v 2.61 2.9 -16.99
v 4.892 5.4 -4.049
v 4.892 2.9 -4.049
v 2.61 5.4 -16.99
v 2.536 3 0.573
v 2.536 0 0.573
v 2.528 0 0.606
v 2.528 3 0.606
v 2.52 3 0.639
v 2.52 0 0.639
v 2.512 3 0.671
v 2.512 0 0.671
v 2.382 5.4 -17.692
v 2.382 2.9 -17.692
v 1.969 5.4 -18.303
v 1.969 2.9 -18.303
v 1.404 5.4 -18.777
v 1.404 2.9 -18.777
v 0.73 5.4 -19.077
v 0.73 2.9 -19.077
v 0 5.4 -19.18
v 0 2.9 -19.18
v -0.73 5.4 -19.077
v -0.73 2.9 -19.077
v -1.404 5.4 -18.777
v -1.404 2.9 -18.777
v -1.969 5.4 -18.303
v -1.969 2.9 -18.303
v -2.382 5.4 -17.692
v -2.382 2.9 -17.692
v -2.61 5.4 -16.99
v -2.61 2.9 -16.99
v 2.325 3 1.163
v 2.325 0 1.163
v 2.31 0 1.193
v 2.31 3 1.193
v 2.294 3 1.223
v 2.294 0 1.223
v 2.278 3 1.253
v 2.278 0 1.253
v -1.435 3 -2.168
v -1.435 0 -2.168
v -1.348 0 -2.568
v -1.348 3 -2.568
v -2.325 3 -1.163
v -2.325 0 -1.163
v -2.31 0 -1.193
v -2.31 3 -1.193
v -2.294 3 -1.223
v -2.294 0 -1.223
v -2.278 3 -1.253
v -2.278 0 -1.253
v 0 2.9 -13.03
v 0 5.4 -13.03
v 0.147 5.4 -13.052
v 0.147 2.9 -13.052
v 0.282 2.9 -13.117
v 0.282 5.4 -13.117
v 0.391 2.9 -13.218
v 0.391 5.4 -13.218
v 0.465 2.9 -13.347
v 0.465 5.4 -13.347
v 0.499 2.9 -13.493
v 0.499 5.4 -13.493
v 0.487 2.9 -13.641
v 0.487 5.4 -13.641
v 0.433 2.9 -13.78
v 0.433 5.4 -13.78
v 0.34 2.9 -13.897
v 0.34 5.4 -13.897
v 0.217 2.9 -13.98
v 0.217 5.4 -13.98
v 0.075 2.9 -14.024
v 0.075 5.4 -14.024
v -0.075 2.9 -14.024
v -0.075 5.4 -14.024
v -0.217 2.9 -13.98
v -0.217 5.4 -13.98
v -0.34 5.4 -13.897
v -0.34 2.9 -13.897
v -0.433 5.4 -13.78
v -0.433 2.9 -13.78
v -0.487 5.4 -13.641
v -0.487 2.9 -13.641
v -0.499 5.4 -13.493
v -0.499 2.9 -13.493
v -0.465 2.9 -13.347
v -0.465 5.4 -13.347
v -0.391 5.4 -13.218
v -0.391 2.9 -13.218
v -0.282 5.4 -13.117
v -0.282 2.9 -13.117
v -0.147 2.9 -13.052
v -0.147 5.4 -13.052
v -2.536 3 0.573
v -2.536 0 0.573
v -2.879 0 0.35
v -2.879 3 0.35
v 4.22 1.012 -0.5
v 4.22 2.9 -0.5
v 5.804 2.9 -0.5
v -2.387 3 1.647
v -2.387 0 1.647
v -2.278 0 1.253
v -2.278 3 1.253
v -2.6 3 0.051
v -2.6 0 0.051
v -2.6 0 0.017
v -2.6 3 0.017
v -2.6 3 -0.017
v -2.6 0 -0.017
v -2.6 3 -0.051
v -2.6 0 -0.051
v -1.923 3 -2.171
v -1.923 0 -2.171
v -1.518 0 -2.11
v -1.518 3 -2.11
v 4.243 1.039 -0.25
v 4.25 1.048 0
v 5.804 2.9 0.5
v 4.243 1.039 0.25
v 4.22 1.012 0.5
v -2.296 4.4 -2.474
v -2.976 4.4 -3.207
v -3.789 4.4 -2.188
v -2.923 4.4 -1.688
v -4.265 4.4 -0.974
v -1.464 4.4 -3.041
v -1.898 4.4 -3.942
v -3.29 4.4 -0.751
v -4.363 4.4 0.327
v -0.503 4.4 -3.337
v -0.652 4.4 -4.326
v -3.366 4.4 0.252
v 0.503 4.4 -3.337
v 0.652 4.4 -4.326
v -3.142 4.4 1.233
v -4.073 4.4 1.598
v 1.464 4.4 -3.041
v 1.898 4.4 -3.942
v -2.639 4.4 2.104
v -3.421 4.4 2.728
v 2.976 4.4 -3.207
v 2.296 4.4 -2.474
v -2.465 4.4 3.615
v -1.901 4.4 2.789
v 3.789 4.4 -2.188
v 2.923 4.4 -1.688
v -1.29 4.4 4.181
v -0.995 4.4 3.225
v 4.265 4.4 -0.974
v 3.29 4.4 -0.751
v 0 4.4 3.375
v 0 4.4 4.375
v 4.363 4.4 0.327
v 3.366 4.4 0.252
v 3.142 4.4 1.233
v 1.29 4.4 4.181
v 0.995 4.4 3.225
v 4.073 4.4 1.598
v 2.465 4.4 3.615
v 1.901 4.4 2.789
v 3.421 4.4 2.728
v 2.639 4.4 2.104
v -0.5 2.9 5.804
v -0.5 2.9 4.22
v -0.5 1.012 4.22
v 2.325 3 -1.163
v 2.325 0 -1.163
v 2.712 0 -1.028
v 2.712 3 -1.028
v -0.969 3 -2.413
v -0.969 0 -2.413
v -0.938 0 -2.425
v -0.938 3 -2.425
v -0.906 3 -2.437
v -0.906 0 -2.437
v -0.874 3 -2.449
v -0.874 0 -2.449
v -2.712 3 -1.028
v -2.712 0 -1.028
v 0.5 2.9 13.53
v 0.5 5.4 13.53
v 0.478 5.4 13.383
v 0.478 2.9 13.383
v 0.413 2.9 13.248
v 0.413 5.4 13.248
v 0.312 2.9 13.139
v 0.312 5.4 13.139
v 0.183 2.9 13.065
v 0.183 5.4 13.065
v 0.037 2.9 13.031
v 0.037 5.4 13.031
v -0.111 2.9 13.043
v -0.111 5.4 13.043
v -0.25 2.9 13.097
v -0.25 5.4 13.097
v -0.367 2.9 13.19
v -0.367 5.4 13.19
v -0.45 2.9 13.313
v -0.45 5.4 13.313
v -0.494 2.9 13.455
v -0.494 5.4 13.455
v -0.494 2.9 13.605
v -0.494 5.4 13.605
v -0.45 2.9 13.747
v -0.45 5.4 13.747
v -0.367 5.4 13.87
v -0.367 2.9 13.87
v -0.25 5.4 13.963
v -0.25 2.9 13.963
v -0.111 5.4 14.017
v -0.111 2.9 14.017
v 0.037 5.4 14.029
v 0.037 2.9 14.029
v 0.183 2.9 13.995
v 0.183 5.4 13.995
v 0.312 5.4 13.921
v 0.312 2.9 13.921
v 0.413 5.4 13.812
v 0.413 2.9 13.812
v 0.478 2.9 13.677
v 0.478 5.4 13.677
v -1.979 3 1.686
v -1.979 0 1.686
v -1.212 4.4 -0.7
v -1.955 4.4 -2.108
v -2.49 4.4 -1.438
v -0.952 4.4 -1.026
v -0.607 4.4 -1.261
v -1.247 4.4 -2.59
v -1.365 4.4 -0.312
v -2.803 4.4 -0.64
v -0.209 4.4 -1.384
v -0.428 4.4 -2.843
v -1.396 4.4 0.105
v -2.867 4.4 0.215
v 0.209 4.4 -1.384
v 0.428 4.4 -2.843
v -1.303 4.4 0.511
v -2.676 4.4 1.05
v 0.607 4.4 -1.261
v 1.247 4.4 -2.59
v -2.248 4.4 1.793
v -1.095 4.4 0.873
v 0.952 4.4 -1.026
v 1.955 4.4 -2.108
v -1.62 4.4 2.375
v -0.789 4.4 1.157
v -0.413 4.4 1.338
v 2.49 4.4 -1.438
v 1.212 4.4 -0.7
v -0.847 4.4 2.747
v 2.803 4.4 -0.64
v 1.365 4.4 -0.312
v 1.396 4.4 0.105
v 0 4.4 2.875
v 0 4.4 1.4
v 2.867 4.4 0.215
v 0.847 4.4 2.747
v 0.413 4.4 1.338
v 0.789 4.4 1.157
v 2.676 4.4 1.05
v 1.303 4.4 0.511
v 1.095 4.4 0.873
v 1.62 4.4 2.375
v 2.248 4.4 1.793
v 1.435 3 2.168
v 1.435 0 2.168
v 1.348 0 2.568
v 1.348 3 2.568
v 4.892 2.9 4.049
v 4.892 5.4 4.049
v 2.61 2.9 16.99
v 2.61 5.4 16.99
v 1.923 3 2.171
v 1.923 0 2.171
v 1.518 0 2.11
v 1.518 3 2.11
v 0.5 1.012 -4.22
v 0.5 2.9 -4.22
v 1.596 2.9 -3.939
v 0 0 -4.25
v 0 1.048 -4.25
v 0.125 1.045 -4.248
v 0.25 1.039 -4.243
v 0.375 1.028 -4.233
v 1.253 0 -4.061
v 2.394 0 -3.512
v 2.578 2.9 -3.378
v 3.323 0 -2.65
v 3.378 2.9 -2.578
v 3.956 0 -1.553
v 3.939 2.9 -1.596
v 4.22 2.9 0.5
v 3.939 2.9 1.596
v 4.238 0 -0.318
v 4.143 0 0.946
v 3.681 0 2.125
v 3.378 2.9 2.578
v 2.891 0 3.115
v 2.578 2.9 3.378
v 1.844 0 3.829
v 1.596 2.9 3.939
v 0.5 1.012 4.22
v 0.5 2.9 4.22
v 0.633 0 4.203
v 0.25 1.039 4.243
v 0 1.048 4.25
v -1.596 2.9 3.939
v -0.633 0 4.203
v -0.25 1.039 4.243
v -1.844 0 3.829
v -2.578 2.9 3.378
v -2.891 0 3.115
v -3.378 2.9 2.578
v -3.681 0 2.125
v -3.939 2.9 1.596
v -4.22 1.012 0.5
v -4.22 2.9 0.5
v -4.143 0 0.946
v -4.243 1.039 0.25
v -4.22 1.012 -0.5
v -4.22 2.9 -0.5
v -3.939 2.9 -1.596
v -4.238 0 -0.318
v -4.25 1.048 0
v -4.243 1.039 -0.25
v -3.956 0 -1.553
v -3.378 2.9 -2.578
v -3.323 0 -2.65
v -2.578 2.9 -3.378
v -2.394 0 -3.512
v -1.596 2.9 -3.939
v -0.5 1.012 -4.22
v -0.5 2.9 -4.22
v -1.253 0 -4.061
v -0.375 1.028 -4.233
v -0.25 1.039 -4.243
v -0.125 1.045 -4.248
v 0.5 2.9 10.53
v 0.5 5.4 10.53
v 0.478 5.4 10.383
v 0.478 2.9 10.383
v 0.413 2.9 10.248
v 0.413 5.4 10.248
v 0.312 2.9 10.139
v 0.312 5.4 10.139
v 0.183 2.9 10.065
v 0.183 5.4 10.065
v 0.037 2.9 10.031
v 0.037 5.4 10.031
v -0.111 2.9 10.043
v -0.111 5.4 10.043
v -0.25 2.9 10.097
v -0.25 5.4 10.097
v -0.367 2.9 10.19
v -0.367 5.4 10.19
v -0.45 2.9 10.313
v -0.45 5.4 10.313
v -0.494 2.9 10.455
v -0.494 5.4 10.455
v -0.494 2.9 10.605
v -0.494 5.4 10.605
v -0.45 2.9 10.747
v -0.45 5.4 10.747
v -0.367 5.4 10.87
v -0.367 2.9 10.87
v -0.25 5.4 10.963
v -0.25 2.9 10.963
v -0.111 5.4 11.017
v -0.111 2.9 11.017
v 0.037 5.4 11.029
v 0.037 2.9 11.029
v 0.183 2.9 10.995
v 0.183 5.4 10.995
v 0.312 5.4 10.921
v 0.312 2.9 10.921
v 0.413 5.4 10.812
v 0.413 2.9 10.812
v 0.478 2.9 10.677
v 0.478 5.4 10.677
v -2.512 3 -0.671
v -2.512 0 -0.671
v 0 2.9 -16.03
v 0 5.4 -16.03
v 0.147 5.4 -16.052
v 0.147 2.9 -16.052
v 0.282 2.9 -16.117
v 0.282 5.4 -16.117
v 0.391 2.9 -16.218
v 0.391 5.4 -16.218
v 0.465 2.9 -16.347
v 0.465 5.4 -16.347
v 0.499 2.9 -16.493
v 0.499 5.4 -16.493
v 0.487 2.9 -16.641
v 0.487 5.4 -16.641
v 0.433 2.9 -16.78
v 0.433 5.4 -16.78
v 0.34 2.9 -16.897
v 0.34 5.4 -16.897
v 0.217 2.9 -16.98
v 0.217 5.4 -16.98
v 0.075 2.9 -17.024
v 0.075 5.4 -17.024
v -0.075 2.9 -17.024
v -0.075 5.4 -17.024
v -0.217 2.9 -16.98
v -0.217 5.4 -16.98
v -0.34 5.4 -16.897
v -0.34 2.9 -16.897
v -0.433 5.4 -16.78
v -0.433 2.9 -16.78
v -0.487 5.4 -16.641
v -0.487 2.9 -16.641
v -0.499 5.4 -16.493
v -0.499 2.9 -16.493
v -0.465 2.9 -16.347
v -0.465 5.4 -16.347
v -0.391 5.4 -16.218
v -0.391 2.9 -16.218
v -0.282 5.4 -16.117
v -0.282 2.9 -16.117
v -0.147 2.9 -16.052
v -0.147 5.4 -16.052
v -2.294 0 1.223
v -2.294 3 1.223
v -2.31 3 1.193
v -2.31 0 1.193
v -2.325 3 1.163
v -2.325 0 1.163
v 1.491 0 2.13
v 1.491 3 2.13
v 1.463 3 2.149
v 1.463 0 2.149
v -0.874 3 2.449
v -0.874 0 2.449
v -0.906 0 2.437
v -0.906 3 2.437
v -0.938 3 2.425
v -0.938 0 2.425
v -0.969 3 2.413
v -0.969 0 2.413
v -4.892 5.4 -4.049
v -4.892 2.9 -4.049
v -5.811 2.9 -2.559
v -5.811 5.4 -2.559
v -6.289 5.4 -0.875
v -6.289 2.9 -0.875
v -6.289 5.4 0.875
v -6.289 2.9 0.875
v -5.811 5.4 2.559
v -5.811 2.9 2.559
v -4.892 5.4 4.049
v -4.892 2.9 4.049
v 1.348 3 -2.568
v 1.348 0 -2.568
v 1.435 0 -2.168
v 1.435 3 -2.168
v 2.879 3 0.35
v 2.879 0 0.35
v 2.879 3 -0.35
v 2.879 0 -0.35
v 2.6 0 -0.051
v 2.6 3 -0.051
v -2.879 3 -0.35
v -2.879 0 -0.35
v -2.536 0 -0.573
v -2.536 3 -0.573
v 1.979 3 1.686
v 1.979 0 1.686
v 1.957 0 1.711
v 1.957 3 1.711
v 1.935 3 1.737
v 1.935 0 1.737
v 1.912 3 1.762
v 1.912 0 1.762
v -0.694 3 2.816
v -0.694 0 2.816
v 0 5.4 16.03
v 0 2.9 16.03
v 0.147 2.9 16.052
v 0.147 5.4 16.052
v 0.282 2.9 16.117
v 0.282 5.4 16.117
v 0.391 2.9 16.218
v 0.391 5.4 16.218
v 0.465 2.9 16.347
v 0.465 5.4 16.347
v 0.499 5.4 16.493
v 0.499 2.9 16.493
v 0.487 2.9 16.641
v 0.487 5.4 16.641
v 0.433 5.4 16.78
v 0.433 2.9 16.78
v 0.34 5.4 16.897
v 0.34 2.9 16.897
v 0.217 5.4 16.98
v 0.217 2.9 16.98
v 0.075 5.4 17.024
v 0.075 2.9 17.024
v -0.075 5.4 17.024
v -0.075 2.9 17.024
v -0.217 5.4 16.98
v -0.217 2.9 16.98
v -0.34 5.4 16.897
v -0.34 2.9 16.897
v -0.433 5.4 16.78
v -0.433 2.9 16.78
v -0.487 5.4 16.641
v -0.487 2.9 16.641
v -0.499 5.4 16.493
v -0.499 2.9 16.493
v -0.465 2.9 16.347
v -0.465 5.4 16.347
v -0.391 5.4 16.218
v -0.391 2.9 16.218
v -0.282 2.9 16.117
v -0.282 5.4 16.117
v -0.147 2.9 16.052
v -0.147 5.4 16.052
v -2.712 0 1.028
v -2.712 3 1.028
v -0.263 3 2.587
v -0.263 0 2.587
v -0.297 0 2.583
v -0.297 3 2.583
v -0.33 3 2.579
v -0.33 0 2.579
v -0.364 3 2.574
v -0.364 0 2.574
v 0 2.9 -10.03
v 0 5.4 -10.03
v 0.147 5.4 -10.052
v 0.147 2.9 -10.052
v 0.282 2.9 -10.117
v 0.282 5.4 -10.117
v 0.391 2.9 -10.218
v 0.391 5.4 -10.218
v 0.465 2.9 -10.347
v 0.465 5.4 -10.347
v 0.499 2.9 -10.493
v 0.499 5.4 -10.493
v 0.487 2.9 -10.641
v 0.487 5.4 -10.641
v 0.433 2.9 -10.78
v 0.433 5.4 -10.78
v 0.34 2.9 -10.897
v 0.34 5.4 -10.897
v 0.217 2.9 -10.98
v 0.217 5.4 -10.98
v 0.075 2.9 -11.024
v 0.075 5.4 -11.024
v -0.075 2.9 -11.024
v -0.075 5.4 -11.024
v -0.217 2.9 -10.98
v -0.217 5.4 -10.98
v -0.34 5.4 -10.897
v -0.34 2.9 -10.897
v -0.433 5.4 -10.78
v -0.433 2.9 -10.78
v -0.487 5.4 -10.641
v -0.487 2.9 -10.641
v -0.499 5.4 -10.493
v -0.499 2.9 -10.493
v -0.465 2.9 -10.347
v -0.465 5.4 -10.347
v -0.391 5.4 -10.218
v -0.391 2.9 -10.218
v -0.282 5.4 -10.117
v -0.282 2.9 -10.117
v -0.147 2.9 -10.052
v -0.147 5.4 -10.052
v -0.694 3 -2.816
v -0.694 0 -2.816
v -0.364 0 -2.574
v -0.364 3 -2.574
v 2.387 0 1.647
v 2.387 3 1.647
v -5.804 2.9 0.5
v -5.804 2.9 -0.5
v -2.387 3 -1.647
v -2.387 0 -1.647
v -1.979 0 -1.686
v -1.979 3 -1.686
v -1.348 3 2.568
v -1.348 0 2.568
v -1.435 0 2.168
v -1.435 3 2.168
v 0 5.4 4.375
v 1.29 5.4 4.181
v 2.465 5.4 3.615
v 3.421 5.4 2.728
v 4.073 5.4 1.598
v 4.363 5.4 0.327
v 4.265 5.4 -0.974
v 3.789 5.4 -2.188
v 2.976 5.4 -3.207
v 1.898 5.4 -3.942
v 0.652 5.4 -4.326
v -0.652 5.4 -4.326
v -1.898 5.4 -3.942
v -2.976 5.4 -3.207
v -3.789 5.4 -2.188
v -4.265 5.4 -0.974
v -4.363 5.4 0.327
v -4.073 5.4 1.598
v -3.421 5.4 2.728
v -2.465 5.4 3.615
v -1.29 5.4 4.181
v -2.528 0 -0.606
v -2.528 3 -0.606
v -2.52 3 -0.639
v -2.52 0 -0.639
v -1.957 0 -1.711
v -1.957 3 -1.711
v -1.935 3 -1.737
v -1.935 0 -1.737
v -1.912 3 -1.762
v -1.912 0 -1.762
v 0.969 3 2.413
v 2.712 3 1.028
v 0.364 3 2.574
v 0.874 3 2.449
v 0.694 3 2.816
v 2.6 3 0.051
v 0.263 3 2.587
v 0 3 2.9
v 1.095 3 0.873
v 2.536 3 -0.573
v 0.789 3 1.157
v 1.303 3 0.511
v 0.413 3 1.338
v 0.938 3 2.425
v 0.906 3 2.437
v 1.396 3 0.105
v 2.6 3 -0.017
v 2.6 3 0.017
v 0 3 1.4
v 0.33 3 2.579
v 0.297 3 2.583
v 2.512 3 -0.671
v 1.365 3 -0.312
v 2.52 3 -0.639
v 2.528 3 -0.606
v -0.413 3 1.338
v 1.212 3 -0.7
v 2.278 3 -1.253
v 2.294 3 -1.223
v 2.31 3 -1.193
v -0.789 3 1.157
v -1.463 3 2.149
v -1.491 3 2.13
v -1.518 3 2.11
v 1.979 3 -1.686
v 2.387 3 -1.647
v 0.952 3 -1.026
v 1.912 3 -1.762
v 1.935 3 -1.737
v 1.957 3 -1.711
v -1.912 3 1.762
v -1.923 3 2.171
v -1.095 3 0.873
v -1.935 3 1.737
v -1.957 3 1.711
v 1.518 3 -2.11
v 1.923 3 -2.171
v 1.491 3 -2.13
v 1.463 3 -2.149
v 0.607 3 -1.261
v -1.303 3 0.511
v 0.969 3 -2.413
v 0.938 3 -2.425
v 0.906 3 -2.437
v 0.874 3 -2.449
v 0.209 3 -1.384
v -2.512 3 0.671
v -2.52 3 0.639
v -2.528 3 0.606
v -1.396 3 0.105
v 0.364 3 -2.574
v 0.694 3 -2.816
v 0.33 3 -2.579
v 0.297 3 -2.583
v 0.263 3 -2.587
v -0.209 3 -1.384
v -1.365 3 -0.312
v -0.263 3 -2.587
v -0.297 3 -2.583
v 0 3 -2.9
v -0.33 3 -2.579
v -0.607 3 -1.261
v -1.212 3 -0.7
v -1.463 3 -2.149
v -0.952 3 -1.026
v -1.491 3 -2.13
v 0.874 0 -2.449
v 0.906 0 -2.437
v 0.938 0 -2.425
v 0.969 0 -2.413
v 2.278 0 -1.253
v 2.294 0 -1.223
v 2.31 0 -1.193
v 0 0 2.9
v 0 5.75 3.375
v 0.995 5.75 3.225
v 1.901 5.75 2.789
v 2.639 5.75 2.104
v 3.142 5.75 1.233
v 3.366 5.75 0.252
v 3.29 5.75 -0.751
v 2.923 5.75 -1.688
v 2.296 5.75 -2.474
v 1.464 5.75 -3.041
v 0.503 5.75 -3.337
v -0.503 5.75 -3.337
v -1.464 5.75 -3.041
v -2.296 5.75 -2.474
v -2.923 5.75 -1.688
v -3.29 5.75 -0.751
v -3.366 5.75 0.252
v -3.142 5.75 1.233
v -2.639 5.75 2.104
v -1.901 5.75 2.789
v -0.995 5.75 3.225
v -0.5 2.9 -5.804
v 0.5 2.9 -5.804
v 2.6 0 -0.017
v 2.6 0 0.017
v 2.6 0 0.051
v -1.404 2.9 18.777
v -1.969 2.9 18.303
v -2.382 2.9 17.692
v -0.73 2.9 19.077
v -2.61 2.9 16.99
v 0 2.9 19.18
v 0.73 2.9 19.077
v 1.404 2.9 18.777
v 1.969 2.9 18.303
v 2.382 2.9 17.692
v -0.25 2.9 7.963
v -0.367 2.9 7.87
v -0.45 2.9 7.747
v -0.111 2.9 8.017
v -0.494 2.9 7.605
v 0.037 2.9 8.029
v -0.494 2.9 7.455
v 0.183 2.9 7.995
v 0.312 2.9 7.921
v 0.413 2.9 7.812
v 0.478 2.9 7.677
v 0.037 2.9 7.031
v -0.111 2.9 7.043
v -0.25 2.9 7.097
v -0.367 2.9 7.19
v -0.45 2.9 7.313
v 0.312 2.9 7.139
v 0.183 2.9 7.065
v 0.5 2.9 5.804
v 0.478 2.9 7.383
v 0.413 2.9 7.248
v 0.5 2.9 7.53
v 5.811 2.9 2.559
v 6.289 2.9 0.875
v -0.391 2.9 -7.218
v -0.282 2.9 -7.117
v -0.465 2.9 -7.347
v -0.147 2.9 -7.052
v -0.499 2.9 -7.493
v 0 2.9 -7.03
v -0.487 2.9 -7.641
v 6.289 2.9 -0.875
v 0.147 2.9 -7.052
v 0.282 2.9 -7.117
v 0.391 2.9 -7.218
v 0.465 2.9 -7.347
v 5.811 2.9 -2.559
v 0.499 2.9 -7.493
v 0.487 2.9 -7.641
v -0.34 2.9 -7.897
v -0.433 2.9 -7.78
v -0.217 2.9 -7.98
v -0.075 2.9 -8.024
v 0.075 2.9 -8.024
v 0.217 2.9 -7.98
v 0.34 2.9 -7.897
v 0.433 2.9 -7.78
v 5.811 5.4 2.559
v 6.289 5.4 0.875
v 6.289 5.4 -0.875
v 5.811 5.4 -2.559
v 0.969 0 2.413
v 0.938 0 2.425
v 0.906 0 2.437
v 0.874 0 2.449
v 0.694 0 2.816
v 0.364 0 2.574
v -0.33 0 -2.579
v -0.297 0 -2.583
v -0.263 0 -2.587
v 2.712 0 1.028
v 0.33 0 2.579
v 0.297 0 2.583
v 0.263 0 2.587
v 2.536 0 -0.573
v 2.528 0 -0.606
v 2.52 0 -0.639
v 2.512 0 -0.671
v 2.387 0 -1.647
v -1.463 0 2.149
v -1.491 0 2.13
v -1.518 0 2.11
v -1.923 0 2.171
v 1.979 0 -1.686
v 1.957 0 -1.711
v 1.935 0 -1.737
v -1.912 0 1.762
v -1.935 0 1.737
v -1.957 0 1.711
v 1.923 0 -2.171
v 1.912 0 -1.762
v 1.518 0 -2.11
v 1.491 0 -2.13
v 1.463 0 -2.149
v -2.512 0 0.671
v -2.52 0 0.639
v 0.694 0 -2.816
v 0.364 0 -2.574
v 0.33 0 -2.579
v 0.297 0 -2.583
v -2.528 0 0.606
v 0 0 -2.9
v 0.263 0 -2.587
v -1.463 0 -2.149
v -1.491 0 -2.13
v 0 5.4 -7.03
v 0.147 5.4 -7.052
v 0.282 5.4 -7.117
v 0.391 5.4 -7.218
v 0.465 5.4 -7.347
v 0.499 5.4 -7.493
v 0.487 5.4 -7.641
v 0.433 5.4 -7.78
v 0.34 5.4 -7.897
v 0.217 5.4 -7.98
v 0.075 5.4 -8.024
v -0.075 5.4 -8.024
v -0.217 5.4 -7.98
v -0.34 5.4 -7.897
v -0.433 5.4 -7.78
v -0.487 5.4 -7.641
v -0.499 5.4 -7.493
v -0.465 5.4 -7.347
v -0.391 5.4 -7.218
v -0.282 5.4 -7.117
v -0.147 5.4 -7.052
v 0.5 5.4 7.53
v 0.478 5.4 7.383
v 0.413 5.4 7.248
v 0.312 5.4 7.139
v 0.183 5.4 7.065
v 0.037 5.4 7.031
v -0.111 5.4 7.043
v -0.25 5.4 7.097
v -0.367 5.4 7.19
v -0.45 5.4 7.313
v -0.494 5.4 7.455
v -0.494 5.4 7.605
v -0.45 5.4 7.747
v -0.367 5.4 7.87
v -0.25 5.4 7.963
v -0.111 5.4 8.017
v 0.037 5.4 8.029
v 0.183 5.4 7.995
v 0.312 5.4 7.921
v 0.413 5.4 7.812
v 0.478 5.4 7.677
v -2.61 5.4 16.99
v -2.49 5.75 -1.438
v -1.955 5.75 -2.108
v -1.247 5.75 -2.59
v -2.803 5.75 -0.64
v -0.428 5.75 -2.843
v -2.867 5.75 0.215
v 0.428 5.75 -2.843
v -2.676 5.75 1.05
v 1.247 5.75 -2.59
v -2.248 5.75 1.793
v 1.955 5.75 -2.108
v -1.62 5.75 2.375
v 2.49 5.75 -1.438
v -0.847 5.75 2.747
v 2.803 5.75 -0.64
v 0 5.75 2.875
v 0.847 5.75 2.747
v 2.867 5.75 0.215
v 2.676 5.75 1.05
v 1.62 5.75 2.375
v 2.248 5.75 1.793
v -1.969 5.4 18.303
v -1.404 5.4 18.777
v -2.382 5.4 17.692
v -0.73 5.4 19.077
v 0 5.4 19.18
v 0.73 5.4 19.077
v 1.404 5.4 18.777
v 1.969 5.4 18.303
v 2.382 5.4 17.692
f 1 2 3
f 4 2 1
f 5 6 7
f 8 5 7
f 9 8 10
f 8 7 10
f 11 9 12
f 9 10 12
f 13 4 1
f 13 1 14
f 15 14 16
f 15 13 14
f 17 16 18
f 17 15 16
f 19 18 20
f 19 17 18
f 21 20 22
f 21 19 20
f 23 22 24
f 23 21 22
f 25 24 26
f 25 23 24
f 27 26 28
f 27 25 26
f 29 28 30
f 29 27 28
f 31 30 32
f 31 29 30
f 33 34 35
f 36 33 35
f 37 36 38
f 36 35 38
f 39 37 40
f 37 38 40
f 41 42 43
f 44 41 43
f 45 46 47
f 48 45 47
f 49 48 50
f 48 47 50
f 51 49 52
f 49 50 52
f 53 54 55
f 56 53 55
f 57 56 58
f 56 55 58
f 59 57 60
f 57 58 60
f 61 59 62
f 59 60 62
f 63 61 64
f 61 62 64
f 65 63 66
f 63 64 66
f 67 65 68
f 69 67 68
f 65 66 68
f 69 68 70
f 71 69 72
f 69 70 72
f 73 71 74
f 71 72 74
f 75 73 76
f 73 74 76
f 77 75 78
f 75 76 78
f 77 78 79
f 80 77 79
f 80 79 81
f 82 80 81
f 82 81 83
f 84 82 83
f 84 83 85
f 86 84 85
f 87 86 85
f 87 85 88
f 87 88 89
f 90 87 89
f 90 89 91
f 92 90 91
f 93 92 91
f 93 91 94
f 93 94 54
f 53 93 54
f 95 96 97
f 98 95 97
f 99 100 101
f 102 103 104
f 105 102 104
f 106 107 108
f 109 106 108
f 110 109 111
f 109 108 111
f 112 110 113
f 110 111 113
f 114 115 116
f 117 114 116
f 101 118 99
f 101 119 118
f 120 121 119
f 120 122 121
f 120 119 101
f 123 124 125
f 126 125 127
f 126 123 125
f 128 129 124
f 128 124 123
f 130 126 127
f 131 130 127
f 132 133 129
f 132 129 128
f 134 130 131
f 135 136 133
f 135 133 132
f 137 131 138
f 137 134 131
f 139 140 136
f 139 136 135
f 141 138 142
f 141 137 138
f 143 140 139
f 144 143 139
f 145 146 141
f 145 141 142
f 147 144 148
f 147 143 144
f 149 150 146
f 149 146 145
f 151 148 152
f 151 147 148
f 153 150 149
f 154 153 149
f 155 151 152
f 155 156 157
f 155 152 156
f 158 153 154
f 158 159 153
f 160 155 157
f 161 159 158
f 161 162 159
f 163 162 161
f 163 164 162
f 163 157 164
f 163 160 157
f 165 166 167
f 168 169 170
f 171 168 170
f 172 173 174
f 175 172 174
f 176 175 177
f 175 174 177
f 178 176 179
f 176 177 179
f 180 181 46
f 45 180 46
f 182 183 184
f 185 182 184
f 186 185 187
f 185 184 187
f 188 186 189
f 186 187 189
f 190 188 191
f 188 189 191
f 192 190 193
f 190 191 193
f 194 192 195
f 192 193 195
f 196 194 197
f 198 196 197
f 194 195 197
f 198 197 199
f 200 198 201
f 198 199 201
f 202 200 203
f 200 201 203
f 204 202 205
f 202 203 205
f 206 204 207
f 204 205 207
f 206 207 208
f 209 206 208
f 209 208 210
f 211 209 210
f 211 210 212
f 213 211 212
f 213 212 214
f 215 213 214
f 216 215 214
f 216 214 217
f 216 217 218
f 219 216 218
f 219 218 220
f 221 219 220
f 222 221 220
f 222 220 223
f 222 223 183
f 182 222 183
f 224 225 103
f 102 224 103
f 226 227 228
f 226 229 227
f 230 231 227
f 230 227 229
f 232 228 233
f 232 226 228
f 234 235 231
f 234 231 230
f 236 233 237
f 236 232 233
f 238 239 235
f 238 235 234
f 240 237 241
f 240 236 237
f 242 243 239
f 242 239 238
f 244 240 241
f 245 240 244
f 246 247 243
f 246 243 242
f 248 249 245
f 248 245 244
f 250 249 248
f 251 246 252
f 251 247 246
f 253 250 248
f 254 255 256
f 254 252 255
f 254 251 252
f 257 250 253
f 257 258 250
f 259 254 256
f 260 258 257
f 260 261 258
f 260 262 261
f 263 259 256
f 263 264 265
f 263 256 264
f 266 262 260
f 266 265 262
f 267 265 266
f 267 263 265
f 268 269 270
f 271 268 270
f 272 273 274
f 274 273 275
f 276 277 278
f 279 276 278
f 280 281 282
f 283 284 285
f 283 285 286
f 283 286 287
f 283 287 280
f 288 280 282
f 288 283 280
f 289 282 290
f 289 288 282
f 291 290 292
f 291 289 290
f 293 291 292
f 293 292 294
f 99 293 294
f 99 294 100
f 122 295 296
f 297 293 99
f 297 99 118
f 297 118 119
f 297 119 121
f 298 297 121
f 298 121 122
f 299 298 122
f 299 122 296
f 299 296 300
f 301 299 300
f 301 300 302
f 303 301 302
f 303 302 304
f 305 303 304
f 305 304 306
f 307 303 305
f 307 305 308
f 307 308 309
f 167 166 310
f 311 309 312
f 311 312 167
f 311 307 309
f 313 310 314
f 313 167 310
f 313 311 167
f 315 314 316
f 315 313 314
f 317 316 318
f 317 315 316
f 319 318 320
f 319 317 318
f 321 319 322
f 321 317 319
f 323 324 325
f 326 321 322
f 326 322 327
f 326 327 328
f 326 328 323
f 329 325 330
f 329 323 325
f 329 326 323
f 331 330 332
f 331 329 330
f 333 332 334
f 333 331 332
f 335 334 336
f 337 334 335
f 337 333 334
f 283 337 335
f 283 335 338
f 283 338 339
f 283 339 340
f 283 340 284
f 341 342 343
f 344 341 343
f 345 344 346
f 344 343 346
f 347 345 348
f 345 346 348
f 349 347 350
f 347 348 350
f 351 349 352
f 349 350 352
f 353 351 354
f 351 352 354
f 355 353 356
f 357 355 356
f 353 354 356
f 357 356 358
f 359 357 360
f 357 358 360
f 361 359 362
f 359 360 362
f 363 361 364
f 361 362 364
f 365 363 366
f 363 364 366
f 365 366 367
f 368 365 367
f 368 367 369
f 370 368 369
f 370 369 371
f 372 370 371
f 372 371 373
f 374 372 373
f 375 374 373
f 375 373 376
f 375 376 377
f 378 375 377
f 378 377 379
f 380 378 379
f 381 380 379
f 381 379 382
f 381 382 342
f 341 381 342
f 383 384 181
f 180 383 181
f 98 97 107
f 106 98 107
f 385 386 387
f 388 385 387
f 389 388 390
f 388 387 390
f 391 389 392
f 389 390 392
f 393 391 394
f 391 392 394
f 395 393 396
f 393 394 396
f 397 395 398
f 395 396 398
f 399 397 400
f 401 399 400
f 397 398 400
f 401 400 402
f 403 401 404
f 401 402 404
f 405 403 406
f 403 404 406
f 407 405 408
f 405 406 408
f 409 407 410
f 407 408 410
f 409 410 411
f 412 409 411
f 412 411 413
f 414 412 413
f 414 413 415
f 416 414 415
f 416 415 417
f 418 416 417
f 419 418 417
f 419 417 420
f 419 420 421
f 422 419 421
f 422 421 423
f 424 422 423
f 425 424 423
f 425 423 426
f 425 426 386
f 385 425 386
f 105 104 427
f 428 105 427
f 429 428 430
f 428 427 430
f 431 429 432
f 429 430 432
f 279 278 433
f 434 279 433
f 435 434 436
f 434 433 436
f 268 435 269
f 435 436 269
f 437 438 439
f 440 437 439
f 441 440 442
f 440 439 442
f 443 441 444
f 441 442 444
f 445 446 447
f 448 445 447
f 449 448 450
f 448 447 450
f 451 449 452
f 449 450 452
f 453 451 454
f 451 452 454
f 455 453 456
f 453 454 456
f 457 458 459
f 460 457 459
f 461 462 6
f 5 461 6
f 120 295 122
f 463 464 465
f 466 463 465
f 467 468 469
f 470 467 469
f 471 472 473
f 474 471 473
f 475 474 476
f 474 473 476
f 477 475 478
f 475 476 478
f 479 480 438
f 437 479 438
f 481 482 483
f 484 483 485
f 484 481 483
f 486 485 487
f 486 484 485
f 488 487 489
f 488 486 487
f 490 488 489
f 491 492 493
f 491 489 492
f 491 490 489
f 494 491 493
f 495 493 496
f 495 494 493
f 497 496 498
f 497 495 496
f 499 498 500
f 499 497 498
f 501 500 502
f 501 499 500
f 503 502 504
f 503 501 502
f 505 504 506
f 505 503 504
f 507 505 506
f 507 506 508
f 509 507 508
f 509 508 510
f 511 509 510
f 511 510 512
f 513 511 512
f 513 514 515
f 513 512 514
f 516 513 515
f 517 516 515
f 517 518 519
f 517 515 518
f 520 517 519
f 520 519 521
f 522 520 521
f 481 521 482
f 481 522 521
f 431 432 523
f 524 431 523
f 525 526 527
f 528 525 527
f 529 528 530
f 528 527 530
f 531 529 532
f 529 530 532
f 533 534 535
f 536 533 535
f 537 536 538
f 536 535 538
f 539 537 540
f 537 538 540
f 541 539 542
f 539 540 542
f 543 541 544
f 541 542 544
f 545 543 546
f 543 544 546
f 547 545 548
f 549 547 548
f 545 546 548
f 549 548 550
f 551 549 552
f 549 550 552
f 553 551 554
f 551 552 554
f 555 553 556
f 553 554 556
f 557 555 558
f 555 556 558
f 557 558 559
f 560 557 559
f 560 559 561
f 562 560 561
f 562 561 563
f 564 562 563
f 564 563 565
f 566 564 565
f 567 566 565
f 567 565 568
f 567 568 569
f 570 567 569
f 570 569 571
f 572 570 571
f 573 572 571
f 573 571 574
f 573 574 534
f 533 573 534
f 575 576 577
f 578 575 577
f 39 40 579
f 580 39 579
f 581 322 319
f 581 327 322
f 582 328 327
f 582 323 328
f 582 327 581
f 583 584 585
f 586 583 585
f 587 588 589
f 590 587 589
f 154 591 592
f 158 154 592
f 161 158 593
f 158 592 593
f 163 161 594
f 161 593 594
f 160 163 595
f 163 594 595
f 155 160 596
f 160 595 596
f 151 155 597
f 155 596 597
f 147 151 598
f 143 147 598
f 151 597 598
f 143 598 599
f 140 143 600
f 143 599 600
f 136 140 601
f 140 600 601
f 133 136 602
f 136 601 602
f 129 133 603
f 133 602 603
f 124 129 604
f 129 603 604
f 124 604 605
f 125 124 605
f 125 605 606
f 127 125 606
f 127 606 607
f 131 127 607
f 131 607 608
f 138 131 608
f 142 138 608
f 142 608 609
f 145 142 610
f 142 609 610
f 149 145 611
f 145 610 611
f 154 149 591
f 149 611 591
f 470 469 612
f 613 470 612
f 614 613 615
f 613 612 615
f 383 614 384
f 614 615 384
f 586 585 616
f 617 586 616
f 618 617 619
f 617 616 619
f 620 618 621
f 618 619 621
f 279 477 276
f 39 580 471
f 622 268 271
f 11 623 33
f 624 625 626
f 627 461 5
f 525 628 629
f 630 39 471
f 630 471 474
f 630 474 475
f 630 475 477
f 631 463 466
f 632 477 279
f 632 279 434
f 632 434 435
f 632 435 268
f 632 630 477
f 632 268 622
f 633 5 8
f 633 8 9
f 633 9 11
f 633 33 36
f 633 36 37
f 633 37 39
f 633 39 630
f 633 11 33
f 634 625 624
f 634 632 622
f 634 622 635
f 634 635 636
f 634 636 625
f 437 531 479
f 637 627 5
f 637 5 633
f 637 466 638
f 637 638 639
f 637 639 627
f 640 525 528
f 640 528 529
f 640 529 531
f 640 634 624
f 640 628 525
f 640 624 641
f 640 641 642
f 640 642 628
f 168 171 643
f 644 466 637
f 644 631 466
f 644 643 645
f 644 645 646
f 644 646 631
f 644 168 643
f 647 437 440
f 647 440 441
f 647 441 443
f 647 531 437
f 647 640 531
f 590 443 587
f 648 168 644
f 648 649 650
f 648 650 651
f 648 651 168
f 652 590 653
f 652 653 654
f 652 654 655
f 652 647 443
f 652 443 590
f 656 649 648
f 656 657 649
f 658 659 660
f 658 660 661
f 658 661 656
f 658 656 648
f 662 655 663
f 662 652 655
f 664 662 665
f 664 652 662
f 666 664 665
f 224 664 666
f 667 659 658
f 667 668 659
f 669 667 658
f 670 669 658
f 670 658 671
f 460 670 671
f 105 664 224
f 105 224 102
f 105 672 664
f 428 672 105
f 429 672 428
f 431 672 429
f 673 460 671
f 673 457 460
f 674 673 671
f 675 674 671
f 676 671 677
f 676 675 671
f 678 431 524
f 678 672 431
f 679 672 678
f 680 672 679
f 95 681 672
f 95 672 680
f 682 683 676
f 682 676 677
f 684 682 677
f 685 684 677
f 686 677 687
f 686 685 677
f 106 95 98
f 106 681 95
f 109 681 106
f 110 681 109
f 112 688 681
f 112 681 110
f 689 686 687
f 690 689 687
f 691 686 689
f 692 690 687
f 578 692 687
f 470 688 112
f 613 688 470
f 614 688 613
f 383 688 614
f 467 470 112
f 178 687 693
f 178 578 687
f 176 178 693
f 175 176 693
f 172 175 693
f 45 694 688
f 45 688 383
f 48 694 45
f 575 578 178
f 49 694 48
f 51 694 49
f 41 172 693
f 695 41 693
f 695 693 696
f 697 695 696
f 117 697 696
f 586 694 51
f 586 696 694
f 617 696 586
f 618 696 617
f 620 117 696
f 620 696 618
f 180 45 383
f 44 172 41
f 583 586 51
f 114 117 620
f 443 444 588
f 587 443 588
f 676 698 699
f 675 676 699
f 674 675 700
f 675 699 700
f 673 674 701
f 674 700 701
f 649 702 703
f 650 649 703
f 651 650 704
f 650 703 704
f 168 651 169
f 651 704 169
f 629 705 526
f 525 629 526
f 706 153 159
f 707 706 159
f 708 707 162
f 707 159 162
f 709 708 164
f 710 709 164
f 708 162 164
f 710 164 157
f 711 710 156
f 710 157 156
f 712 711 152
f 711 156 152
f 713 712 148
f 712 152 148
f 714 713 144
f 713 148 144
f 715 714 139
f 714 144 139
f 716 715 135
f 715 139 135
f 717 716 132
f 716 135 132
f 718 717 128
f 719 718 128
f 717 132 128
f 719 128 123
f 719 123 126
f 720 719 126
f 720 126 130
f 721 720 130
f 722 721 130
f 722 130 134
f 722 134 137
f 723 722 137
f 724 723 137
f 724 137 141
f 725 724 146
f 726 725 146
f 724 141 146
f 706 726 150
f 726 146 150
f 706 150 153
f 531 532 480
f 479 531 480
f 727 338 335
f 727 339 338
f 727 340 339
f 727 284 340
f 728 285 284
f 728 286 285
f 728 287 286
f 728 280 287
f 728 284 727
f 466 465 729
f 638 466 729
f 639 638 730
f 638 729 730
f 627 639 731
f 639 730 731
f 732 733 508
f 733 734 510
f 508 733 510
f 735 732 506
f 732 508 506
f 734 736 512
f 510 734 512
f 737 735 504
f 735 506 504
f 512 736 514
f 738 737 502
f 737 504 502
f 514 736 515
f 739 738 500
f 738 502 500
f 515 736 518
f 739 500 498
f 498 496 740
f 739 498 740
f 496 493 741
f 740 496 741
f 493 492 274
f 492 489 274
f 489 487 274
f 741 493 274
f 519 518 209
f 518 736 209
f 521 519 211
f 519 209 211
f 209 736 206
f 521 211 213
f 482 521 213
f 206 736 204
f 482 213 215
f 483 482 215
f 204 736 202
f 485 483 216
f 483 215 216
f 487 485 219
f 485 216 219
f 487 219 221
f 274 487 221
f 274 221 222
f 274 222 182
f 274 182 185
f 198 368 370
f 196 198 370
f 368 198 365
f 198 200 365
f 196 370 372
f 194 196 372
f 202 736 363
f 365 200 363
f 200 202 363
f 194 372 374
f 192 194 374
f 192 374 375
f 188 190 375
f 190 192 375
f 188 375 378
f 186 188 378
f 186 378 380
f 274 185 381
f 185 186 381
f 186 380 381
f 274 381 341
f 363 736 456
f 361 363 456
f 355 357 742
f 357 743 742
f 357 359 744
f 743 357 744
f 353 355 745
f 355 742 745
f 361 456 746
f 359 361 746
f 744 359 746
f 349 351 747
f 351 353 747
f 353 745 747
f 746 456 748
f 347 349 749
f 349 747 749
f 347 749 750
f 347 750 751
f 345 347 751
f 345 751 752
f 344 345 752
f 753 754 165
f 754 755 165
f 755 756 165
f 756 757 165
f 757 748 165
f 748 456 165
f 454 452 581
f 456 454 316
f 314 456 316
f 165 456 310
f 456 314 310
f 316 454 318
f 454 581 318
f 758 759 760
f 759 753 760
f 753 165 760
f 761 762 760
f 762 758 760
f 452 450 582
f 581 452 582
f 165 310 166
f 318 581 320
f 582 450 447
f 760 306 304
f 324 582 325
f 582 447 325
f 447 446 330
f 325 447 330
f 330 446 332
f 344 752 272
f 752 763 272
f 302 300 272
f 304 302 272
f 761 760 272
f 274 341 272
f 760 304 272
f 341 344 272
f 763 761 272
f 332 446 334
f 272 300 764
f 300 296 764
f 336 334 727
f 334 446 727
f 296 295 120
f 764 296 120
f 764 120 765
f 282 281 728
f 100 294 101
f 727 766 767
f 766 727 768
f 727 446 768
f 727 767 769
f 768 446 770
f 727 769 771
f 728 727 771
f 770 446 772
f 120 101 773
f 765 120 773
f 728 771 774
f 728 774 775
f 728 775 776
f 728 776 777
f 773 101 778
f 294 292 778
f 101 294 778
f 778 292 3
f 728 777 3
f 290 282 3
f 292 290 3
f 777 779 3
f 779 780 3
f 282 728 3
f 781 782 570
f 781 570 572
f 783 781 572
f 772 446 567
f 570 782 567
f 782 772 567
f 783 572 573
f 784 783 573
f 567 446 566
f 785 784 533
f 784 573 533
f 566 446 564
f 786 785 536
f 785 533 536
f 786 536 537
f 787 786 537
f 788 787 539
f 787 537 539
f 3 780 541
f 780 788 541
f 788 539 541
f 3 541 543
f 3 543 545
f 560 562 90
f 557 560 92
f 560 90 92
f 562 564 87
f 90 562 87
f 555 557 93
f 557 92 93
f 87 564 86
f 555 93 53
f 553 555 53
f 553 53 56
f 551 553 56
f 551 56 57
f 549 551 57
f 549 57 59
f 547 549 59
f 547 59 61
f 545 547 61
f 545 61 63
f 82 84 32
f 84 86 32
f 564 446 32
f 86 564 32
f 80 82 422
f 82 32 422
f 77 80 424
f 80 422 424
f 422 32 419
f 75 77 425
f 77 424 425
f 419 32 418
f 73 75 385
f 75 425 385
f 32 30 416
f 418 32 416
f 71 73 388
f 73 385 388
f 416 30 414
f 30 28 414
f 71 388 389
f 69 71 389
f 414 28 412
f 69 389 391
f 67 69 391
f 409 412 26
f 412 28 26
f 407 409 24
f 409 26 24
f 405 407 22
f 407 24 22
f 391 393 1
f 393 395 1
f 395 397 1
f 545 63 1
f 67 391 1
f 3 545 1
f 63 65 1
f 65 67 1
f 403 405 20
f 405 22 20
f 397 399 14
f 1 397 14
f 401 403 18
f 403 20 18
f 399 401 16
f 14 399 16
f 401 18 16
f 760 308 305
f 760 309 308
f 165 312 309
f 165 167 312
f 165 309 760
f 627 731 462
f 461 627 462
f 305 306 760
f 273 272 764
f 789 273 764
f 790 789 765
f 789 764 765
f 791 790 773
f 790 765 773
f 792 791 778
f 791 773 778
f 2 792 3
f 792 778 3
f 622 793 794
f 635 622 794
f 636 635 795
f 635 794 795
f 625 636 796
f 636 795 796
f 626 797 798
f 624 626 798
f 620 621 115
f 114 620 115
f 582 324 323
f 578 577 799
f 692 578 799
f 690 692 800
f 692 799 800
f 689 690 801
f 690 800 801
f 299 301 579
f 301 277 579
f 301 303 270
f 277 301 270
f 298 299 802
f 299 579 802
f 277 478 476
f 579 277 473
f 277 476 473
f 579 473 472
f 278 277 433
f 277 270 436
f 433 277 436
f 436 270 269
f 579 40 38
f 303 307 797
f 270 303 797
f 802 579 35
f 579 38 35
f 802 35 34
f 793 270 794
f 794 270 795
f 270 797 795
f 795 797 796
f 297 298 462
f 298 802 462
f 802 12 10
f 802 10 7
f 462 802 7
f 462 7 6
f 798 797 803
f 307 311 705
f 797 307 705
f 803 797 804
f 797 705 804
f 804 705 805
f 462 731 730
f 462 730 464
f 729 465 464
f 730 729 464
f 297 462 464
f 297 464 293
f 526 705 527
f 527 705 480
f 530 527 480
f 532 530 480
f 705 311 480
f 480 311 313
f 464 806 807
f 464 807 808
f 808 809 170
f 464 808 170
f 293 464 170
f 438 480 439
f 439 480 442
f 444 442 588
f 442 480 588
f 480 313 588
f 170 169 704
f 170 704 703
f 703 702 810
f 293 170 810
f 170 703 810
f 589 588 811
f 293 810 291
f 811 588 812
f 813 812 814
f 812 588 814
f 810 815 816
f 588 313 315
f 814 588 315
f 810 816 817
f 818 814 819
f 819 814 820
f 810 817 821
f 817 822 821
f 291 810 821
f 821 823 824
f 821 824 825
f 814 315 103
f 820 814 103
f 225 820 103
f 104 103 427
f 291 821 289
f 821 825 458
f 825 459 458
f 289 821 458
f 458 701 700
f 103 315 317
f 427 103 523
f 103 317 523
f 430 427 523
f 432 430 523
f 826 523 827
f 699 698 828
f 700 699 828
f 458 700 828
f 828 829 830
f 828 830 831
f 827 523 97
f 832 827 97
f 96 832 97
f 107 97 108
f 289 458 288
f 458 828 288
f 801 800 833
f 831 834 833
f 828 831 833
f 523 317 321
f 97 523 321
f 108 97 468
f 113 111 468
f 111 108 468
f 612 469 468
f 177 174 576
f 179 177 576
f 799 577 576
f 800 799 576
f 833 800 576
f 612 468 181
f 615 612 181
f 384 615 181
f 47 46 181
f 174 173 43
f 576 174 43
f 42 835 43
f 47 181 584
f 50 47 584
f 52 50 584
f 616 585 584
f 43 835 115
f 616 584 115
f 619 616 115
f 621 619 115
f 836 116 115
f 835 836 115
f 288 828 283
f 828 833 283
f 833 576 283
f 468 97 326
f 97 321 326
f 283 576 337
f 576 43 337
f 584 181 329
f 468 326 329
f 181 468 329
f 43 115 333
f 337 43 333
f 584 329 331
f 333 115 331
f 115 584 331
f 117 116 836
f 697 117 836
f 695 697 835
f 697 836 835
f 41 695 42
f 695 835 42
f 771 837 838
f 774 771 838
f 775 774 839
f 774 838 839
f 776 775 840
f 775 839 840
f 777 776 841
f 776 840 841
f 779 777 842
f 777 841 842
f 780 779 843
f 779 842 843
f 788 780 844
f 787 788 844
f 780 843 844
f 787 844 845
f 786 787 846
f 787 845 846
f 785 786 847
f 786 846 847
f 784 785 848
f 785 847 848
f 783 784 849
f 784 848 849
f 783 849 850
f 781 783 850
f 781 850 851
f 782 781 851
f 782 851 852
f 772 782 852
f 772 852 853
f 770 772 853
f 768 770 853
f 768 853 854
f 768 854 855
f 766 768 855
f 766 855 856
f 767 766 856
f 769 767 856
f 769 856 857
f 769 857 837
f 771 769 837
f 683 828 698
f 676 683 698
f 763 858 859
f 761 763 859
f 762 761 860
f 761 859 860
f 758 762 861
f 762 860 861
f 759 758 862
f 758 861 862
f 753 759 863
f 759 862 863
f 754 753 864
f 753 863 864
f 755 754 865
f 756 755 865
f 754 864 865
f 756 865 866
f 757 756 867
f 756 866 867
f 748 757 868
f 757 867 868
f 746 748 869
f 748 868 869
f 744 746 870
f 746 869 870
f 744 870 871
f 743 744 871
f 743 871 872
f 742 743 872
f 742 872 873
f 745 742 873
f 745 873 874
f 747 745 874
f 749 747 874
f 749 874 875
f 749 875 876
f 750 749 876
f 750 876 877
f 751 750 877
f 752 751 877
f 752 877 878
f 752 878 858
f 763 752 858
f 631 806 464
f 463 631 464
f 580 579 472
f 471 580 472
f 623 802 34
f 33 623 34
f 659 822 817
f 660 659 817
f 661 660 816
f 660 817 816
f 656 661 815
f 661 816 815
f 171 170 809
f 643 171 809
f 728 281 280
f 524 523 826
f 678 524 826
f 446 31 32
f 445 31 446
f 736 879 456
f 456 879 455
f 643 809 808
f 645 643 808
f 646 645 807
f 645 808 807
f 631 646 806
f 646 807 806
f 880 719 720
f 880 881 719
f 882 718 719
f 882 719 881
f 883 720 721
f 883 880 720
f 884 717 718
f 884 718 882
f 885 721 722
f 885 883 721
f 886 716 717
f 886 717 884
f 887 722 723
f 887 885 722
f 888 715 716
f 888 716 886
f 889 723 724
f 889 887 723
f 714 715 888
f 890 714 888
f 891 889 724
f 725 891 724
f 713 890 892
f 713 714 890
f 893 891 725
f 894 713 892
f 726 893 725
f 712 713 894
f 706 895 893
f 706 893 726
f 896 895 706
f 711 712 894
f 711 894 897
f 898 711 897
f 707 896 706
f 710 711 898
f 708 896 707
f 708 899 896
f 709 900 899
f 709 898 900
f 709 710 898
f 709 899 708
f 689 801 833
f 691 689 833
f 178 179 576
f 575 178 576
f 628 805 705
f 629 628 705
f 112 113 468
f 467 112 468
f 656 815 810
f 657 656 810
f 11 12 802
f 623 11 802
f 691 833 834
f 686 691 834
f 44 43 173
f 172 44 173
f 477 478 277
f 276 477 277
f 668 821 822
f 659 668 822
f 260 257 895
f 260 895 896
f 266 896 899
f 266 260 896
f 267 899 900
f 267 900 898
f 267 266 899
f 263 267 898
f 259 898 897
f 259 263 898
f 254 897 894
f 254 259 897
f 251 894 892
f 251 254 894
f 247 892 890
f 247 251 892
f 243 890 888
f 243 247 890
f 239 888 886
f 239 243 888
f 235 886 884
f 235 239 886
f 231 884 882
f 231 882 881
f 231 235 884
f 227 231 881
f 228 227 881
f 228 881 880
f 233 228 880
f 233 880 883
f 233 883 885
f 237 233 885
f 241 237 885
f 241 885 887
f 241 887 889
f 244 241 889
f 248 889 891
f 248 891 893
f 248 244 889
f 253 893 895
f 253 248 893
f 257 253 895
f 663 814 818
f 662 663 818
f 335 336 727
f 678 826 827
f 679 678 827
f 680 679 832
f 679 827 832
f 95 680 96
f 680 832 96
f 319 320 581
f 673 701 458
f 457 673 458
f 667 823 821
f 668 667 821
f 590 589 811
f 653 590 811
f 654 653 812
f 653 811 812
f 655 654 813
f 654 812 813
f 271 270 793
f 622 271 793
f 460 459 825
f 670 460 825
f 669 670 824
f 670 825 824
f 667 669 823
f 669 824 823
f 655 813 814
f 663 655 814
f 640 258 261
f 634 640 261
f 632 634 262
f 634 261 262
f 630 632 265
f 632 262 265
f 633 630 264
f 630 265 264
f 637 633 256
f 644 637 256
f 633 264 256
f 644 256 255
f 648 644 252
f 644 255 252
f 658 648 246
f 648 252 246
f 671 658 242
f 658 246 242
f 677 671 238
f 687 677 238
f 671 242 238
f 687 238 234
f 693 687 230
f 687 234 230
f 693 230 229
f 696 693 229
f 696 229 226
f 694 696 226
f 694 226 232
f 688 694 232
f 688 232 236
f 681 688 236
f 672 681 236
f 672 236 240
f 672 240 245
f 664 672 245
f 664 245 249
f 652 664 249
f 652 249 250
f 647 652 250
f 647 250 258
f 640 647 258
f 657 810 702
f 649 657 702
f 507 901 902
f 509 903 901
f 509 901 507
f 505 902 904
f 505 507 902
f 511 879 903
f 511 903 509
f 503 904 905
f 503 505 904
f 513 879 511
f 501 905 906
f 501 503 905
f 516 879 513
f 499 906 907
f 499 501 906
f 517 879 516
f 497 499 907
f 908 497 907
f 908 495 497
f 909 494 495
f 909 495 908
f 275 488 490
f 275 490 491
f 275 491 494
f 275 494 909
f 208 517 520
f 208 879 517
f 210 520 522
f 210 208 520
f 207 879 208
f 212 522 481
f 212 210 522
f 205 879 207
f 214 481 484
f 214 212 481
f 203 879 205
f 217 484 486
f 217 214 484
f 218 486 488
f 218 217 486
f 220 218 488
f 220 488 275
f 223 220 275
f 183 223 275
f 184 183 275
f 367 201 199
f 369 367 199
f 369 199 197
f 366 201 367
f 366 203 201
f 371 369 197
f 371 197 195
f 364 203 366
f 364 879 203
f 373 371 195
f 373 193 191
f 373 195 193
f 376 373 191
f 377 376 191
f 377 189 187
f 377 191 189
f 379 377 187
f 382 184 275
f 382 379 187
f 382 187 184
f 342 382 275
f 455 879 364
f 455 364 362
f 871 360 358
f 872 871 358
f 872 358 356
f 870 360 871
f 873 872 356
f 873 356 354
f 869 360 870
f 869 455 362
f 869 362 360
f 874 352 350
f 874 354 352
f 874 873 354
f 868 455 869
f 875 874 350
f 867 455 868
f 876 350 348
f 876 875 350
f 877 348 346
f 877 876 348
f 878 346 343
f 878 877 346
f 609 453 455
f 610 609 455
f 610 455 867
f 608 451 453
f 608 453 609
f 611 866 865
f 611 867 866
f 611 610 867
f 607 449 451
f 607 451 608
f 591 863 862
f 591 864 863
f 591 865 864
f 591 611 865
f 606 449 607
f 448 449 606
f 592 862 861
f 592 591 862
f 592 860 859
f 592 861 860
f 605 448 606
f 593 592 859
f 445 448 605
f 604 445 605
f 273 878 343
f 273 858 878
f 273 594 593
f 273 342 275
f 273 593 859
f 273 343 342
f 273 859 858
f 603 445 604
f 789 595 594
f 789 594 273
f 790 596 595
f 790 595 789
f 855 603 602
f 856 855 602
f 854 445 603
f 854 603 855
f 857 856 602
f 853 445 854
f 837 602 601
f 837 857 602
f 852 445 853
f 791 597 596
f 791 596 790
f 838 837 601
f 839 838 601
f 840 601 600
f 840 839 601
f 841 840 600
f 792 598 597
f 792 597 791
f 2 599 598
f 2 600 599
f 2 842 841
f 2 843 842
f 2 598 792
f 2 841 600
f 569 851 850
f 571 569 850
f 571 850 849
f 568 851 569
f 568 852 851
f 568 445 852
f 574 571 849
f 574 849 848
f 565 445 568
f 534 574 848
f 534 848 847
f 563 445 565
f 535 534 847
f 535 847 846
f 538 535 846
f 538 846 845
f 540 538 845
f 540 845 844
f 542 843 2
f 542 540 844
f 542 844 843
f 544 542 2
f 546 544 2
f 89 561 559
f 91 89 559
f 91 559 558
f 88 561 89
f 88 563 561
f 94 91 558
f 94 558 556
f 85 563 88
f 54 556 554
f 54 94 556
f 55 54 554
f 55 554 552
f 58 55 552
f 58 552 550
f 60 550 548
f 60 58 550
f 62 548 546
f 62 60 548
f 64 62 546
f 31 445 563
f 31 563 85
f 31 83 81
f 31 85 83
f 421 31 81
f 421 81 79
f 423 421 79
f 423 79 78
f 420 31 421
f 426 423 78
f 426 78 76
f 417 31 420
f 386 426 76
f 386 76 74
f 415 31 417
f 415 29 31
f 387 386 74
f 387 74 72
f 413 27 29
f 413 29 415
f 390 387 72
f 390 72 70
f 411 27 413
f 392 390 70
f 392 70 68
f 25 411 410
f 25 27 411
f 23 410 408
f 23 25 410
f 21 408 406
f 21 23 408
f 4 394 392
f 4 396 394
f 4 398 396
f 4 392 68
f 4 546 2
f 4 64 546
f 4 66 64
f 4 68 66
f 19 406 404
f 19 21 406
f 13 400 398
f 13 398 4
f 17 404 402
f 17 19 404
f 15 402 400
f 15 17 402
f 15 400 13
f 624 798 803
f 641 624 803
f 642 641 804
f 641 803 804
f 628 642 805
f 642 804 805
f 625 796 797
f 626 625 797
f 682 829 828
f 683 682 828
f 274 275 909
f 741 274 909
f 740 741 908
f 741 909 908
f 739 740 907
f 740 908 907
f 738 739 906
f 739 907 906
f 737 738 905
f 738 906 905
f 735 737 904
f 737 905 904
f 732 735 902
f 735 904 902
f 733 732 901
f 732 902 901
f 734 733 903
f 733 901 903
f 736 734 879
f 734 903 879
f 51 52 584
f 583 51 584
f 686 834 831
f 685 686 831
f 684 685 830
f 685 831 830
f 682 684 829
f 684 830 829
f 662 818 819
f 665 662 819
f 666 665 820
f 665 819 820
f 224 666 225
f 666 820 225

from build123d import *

# Parameters (mm, degrees)
BASES_R                     = 6.35
BASE_DEPTH                  = 5.4
TOPBORES_R                  = 1.4
TOP_BORE_DEPTH              = 11.478788098
HORN_HALF_DEPTH             = 2.5
HORNATTACHS_R               = 0.5
HORN_ATTACH_DEPTH           = 21.913031822
HA_LP_COUNT                 = 4
HA_LP_PITCH                 = 3
HORN_BODIES_COPY_1_SKETCH_R = 0.5
HORN_BODIES_COPY_1_DEPTH    = 21.913031822
HORN_BODIES_COPY_2_SKETCH_R = 0.5
HORN_BODIES_COPY_2_DEPTH    = 21.913031822
HORN_BODIES_COPY_3_SKETCH_R = 0.5
HORN_BODIES_COPY_3_DEPTH    = 21.913031822
TOOTH_DEPTH                 = 3
TOOTH_CP_COUNT              = 26
BOTTOMBORES_R               = 2.6
BOTTOM_BORE_DEPTH           = 3
HOLDINGSHAFTS_R             = 6.35
HOLDINGSHAFTS_R_2           = 4.25
HOLDING_SHAFT_DEPTH         = 2.9
RIB_DEPTH                   = 0.5
RIB_CP_COUNT                = 4
TOPCUTS_R                   = 4.375
TOP_CUT_DEPTH               = 1
TOPPOCKETCYLINDERS_R        = 3.375
TOPPOCKETCYLINDERS_R_2      = 2.875
TOP_POCKET_CYLINDER_DEPTH   = 1.35


with BuildPart() as part:
    # BaseS → BASE (new body)
    with BuildSketch(Plane(origin=(0, 0, 0), x_dir=(1, 0, 0), z_dir=(0, 1, 0))):
        with Locations(Location((0, 0, 0), (0, 0, 90))):
            Circle(BASES_R)
    extrude(amount=BASE_DEPTH)

    # TopBoreS → TOP BORE (cut, through all)
    with BuildSketch(Plane(origin=(0, 5.4, 0), x_dir=(1, 0, 0), z_dir=(0, 1, 0))):
        with Locations(Location((0, 0, 0), (0, 0, 270))):
            Circle(TOPBORES_R)
    extrude(amount=-TOP_BORE_DEPTH, mode=Mode.SUBTRACT)

    # HornHalfS → HORN HALF (add)
    with BuildSketch(Plane(origin=(0, 5.4, 0), x_dir=(1, 0, 0), z_dir=(0, 1, 0))):
        with BuildLine():
            Line((-2.609740545, 16.990167671), (-4.891612682, 4.049027706))
            ThreePointArc((-4.891612682, 4.049027706), (0, 6.35), (4.891612682, 4.049027706))
            Line((4.891612682, 4.049027706), (2.609740545, 16.990167671))
            ThreePointArc((2.609740545, 16.990167671), (0, 19.18), (-2.609740545, 16.990167671))
        make_face()
    horn_half = extrude(amount=-HORN_HALF_DEPTH)

    # HornAttachS → HORN ATTACH (cut, through all)
    with BuildSketch(Plane(origin=(0, 5.4, 0), x_dir=(1, 0, 0), z_dir=(0, 1, 0))):
        with Locations(Location((0, 16.53, 0), (0, 0, 270))):
            Circle(HORNATTACHS_R)
    horn_attach = extrude(amount=-HORN_ATTACH_DEPTH, mode=Mode.SUBTRACT)

    # HA LP: HORN ATTACH ×4
    with Locations(*[(0, 0, i * HA_LP_PITCH) for i in range(1, HA_LP_COUNT)]):
        add(horn_attach, mode=Mode.SUBTRACT)

    # HORN BODIES: HORN HALF, HORN ATTACH across plane
    add(horn_half.mirror(Plane.XY))
    add(horn_attach.mirror(Plane.XY), mode=Mode.SUBTRACT)

    # HORN BODIES copy 1 sketch → HORN BODIES copy 1 (cut, through all)
    with BuildSketch(Plane(origin=(0, 5.4, -3), x_dir=(1, 0, 0), z_dir=(0, 1, 0))):
        with Locations((0, -16.53)):
            Circle(HORN_BODIES_COPY_1_SKETCH_R)
    extrude(amount=-HORN_BODIES_COPY_1_DEPTH, mode=Mode.SUBTRACT)

    # HORN BODIES copy 2 sketch → HORN BODIES copy 2 (cut, through all)
    with BuildSketch(Plane(origin=(0, 5.4, -6), x_dir=(1, 0, 0), z_dir=(0, 1, 0))):
        with Locations((0, -16.53)):
            Circle(HORN_BODIES_COPY_2_SKETCH_R)
    extrude(amount=-HORN_BODIES_COPY_2_DEPTH, mode=Mode.SUBTRACT)

    # HORN BODIES copy 3 sketch → HORN BODIES copy 3 (cut, through all)
    with BuildSketch(Plane(origin=(0, 5.4, -9), x_dir=(1, 0, 0), z_dir=(0, 1, 0))):
        with Locations((0, -16.53)):
            Circle(HORN_BODIES_COPY_3_SKETCH_R)
    extrude(amount=-HORN_BODIES_COPY_3_DEPTH, mode=Mode.SUBTRACT)

    # ToothS → TOOTH (cut)
    with BuildSketch(Plane.XZ):
        with BuildLine():
            Line((0, -2.9), (0.262912611, -2.586672952))
            ThreePointArc((0.262912611, -2.586672952), (0, -2.6), (-0.262912611, -2.586672952))
            Line((-0.262912611, -2.586672952), (0, -2.9))
        make_face()
    tooth = extrude(amount=-TOOTH_DEPTH, mode=Mode.SUBTRACT)

    # TOOTH CP: TOOTH ×26 about axis
    tooth_cp_axis = Axis((0, 0, 0), (0, 1, 0))
    for i in range(1, TOOTH_CP_COUNT):
        add(tooth.rotate(tooth_cp_axis, i * 360 / TOOTH_CP_COUNT), mode=Mode.SUBTRACT)

    # BottomBoreS → BOTTOM BORE (cut)
    with BuildSketch(Plane(origin=(0, 0, 0), x_dir=(-1, 0, 0), z_dir=(0, -1, 0))):
        Circle(BOTTOMBORES_R)
    extrude(amount=-BOTTOM_BORE_DEPTH, mode=Mode.SUBTRACT)

    # HoldingShaftS → HOLDING SHAFT (cut)
    with BuildSketch(Plane.XZ):
        Circle(HOLDINGSHAFTS_R)
        with Locations(Location((0, 0, 0), (0, 0, 270))):
            Circle(HOLDINGSHAFTS_R_2, mode=Mode.SUBTRACT)
    extrude(amount=-HOLDING_SHAFT_DEPTH, mode=Mode.SUBTRACT)

    # RibS → RIB (add, symmetric)
    with BuildSketch(Plane.XY):
        Polygon((4.21, 1), (5.804289299, 2.9), (4.21, 2.9), (4.16, 2.9), (4.16, 1), align=None)
    rib = extrude(amount=RIB_DEPTH, both=True)

    # RIB CP: RIB ×4 about axis
    rib_cp_axis = Axis((0, 0, 0), (0, 1, 0))
    for i in range(1, RIB_CP_COUNT):
        add(rib.rotate(rib_cp_axis, i * 360 / RIB_CP_COUNT))

    # TopCutS → TOP CUT (cut)
    with BuildSketch(Plane(origin=(0, 5.4, 0), x_dir=(1, 0, 0), z_dir=(0, 1, 0))):
        with Locations(Location((0, 0, 0), (0, 0, 270))):
            Circle(TOPCUTS_R)
    extrude(amount=-TOP_CUT_DEPTH, mode=Mode.SUBTRACT)

    # TopPocketCylinderS → TOP POCKET CYLINDER (add)
    with BuildSketch(Plane(origin=(0, 4.4, 0), x_dir=(1, 0, 0), z_dir=(0, 1, 0))):
        with Locations(Location((0, 0, 0), (0, 0, 270))):
            Circle(TOPPOCKETCYLINDERS_R)
        with Locations(Location((0, 0, 0), (0, 0, 270))):
            Circle(TOPPOCKETCYLINDERS_R_2, mode=Mode.SUBTRACT)
    extrude(amount=TOP_POCKET_CYLINDER_DEPTH)


solid = part.part
